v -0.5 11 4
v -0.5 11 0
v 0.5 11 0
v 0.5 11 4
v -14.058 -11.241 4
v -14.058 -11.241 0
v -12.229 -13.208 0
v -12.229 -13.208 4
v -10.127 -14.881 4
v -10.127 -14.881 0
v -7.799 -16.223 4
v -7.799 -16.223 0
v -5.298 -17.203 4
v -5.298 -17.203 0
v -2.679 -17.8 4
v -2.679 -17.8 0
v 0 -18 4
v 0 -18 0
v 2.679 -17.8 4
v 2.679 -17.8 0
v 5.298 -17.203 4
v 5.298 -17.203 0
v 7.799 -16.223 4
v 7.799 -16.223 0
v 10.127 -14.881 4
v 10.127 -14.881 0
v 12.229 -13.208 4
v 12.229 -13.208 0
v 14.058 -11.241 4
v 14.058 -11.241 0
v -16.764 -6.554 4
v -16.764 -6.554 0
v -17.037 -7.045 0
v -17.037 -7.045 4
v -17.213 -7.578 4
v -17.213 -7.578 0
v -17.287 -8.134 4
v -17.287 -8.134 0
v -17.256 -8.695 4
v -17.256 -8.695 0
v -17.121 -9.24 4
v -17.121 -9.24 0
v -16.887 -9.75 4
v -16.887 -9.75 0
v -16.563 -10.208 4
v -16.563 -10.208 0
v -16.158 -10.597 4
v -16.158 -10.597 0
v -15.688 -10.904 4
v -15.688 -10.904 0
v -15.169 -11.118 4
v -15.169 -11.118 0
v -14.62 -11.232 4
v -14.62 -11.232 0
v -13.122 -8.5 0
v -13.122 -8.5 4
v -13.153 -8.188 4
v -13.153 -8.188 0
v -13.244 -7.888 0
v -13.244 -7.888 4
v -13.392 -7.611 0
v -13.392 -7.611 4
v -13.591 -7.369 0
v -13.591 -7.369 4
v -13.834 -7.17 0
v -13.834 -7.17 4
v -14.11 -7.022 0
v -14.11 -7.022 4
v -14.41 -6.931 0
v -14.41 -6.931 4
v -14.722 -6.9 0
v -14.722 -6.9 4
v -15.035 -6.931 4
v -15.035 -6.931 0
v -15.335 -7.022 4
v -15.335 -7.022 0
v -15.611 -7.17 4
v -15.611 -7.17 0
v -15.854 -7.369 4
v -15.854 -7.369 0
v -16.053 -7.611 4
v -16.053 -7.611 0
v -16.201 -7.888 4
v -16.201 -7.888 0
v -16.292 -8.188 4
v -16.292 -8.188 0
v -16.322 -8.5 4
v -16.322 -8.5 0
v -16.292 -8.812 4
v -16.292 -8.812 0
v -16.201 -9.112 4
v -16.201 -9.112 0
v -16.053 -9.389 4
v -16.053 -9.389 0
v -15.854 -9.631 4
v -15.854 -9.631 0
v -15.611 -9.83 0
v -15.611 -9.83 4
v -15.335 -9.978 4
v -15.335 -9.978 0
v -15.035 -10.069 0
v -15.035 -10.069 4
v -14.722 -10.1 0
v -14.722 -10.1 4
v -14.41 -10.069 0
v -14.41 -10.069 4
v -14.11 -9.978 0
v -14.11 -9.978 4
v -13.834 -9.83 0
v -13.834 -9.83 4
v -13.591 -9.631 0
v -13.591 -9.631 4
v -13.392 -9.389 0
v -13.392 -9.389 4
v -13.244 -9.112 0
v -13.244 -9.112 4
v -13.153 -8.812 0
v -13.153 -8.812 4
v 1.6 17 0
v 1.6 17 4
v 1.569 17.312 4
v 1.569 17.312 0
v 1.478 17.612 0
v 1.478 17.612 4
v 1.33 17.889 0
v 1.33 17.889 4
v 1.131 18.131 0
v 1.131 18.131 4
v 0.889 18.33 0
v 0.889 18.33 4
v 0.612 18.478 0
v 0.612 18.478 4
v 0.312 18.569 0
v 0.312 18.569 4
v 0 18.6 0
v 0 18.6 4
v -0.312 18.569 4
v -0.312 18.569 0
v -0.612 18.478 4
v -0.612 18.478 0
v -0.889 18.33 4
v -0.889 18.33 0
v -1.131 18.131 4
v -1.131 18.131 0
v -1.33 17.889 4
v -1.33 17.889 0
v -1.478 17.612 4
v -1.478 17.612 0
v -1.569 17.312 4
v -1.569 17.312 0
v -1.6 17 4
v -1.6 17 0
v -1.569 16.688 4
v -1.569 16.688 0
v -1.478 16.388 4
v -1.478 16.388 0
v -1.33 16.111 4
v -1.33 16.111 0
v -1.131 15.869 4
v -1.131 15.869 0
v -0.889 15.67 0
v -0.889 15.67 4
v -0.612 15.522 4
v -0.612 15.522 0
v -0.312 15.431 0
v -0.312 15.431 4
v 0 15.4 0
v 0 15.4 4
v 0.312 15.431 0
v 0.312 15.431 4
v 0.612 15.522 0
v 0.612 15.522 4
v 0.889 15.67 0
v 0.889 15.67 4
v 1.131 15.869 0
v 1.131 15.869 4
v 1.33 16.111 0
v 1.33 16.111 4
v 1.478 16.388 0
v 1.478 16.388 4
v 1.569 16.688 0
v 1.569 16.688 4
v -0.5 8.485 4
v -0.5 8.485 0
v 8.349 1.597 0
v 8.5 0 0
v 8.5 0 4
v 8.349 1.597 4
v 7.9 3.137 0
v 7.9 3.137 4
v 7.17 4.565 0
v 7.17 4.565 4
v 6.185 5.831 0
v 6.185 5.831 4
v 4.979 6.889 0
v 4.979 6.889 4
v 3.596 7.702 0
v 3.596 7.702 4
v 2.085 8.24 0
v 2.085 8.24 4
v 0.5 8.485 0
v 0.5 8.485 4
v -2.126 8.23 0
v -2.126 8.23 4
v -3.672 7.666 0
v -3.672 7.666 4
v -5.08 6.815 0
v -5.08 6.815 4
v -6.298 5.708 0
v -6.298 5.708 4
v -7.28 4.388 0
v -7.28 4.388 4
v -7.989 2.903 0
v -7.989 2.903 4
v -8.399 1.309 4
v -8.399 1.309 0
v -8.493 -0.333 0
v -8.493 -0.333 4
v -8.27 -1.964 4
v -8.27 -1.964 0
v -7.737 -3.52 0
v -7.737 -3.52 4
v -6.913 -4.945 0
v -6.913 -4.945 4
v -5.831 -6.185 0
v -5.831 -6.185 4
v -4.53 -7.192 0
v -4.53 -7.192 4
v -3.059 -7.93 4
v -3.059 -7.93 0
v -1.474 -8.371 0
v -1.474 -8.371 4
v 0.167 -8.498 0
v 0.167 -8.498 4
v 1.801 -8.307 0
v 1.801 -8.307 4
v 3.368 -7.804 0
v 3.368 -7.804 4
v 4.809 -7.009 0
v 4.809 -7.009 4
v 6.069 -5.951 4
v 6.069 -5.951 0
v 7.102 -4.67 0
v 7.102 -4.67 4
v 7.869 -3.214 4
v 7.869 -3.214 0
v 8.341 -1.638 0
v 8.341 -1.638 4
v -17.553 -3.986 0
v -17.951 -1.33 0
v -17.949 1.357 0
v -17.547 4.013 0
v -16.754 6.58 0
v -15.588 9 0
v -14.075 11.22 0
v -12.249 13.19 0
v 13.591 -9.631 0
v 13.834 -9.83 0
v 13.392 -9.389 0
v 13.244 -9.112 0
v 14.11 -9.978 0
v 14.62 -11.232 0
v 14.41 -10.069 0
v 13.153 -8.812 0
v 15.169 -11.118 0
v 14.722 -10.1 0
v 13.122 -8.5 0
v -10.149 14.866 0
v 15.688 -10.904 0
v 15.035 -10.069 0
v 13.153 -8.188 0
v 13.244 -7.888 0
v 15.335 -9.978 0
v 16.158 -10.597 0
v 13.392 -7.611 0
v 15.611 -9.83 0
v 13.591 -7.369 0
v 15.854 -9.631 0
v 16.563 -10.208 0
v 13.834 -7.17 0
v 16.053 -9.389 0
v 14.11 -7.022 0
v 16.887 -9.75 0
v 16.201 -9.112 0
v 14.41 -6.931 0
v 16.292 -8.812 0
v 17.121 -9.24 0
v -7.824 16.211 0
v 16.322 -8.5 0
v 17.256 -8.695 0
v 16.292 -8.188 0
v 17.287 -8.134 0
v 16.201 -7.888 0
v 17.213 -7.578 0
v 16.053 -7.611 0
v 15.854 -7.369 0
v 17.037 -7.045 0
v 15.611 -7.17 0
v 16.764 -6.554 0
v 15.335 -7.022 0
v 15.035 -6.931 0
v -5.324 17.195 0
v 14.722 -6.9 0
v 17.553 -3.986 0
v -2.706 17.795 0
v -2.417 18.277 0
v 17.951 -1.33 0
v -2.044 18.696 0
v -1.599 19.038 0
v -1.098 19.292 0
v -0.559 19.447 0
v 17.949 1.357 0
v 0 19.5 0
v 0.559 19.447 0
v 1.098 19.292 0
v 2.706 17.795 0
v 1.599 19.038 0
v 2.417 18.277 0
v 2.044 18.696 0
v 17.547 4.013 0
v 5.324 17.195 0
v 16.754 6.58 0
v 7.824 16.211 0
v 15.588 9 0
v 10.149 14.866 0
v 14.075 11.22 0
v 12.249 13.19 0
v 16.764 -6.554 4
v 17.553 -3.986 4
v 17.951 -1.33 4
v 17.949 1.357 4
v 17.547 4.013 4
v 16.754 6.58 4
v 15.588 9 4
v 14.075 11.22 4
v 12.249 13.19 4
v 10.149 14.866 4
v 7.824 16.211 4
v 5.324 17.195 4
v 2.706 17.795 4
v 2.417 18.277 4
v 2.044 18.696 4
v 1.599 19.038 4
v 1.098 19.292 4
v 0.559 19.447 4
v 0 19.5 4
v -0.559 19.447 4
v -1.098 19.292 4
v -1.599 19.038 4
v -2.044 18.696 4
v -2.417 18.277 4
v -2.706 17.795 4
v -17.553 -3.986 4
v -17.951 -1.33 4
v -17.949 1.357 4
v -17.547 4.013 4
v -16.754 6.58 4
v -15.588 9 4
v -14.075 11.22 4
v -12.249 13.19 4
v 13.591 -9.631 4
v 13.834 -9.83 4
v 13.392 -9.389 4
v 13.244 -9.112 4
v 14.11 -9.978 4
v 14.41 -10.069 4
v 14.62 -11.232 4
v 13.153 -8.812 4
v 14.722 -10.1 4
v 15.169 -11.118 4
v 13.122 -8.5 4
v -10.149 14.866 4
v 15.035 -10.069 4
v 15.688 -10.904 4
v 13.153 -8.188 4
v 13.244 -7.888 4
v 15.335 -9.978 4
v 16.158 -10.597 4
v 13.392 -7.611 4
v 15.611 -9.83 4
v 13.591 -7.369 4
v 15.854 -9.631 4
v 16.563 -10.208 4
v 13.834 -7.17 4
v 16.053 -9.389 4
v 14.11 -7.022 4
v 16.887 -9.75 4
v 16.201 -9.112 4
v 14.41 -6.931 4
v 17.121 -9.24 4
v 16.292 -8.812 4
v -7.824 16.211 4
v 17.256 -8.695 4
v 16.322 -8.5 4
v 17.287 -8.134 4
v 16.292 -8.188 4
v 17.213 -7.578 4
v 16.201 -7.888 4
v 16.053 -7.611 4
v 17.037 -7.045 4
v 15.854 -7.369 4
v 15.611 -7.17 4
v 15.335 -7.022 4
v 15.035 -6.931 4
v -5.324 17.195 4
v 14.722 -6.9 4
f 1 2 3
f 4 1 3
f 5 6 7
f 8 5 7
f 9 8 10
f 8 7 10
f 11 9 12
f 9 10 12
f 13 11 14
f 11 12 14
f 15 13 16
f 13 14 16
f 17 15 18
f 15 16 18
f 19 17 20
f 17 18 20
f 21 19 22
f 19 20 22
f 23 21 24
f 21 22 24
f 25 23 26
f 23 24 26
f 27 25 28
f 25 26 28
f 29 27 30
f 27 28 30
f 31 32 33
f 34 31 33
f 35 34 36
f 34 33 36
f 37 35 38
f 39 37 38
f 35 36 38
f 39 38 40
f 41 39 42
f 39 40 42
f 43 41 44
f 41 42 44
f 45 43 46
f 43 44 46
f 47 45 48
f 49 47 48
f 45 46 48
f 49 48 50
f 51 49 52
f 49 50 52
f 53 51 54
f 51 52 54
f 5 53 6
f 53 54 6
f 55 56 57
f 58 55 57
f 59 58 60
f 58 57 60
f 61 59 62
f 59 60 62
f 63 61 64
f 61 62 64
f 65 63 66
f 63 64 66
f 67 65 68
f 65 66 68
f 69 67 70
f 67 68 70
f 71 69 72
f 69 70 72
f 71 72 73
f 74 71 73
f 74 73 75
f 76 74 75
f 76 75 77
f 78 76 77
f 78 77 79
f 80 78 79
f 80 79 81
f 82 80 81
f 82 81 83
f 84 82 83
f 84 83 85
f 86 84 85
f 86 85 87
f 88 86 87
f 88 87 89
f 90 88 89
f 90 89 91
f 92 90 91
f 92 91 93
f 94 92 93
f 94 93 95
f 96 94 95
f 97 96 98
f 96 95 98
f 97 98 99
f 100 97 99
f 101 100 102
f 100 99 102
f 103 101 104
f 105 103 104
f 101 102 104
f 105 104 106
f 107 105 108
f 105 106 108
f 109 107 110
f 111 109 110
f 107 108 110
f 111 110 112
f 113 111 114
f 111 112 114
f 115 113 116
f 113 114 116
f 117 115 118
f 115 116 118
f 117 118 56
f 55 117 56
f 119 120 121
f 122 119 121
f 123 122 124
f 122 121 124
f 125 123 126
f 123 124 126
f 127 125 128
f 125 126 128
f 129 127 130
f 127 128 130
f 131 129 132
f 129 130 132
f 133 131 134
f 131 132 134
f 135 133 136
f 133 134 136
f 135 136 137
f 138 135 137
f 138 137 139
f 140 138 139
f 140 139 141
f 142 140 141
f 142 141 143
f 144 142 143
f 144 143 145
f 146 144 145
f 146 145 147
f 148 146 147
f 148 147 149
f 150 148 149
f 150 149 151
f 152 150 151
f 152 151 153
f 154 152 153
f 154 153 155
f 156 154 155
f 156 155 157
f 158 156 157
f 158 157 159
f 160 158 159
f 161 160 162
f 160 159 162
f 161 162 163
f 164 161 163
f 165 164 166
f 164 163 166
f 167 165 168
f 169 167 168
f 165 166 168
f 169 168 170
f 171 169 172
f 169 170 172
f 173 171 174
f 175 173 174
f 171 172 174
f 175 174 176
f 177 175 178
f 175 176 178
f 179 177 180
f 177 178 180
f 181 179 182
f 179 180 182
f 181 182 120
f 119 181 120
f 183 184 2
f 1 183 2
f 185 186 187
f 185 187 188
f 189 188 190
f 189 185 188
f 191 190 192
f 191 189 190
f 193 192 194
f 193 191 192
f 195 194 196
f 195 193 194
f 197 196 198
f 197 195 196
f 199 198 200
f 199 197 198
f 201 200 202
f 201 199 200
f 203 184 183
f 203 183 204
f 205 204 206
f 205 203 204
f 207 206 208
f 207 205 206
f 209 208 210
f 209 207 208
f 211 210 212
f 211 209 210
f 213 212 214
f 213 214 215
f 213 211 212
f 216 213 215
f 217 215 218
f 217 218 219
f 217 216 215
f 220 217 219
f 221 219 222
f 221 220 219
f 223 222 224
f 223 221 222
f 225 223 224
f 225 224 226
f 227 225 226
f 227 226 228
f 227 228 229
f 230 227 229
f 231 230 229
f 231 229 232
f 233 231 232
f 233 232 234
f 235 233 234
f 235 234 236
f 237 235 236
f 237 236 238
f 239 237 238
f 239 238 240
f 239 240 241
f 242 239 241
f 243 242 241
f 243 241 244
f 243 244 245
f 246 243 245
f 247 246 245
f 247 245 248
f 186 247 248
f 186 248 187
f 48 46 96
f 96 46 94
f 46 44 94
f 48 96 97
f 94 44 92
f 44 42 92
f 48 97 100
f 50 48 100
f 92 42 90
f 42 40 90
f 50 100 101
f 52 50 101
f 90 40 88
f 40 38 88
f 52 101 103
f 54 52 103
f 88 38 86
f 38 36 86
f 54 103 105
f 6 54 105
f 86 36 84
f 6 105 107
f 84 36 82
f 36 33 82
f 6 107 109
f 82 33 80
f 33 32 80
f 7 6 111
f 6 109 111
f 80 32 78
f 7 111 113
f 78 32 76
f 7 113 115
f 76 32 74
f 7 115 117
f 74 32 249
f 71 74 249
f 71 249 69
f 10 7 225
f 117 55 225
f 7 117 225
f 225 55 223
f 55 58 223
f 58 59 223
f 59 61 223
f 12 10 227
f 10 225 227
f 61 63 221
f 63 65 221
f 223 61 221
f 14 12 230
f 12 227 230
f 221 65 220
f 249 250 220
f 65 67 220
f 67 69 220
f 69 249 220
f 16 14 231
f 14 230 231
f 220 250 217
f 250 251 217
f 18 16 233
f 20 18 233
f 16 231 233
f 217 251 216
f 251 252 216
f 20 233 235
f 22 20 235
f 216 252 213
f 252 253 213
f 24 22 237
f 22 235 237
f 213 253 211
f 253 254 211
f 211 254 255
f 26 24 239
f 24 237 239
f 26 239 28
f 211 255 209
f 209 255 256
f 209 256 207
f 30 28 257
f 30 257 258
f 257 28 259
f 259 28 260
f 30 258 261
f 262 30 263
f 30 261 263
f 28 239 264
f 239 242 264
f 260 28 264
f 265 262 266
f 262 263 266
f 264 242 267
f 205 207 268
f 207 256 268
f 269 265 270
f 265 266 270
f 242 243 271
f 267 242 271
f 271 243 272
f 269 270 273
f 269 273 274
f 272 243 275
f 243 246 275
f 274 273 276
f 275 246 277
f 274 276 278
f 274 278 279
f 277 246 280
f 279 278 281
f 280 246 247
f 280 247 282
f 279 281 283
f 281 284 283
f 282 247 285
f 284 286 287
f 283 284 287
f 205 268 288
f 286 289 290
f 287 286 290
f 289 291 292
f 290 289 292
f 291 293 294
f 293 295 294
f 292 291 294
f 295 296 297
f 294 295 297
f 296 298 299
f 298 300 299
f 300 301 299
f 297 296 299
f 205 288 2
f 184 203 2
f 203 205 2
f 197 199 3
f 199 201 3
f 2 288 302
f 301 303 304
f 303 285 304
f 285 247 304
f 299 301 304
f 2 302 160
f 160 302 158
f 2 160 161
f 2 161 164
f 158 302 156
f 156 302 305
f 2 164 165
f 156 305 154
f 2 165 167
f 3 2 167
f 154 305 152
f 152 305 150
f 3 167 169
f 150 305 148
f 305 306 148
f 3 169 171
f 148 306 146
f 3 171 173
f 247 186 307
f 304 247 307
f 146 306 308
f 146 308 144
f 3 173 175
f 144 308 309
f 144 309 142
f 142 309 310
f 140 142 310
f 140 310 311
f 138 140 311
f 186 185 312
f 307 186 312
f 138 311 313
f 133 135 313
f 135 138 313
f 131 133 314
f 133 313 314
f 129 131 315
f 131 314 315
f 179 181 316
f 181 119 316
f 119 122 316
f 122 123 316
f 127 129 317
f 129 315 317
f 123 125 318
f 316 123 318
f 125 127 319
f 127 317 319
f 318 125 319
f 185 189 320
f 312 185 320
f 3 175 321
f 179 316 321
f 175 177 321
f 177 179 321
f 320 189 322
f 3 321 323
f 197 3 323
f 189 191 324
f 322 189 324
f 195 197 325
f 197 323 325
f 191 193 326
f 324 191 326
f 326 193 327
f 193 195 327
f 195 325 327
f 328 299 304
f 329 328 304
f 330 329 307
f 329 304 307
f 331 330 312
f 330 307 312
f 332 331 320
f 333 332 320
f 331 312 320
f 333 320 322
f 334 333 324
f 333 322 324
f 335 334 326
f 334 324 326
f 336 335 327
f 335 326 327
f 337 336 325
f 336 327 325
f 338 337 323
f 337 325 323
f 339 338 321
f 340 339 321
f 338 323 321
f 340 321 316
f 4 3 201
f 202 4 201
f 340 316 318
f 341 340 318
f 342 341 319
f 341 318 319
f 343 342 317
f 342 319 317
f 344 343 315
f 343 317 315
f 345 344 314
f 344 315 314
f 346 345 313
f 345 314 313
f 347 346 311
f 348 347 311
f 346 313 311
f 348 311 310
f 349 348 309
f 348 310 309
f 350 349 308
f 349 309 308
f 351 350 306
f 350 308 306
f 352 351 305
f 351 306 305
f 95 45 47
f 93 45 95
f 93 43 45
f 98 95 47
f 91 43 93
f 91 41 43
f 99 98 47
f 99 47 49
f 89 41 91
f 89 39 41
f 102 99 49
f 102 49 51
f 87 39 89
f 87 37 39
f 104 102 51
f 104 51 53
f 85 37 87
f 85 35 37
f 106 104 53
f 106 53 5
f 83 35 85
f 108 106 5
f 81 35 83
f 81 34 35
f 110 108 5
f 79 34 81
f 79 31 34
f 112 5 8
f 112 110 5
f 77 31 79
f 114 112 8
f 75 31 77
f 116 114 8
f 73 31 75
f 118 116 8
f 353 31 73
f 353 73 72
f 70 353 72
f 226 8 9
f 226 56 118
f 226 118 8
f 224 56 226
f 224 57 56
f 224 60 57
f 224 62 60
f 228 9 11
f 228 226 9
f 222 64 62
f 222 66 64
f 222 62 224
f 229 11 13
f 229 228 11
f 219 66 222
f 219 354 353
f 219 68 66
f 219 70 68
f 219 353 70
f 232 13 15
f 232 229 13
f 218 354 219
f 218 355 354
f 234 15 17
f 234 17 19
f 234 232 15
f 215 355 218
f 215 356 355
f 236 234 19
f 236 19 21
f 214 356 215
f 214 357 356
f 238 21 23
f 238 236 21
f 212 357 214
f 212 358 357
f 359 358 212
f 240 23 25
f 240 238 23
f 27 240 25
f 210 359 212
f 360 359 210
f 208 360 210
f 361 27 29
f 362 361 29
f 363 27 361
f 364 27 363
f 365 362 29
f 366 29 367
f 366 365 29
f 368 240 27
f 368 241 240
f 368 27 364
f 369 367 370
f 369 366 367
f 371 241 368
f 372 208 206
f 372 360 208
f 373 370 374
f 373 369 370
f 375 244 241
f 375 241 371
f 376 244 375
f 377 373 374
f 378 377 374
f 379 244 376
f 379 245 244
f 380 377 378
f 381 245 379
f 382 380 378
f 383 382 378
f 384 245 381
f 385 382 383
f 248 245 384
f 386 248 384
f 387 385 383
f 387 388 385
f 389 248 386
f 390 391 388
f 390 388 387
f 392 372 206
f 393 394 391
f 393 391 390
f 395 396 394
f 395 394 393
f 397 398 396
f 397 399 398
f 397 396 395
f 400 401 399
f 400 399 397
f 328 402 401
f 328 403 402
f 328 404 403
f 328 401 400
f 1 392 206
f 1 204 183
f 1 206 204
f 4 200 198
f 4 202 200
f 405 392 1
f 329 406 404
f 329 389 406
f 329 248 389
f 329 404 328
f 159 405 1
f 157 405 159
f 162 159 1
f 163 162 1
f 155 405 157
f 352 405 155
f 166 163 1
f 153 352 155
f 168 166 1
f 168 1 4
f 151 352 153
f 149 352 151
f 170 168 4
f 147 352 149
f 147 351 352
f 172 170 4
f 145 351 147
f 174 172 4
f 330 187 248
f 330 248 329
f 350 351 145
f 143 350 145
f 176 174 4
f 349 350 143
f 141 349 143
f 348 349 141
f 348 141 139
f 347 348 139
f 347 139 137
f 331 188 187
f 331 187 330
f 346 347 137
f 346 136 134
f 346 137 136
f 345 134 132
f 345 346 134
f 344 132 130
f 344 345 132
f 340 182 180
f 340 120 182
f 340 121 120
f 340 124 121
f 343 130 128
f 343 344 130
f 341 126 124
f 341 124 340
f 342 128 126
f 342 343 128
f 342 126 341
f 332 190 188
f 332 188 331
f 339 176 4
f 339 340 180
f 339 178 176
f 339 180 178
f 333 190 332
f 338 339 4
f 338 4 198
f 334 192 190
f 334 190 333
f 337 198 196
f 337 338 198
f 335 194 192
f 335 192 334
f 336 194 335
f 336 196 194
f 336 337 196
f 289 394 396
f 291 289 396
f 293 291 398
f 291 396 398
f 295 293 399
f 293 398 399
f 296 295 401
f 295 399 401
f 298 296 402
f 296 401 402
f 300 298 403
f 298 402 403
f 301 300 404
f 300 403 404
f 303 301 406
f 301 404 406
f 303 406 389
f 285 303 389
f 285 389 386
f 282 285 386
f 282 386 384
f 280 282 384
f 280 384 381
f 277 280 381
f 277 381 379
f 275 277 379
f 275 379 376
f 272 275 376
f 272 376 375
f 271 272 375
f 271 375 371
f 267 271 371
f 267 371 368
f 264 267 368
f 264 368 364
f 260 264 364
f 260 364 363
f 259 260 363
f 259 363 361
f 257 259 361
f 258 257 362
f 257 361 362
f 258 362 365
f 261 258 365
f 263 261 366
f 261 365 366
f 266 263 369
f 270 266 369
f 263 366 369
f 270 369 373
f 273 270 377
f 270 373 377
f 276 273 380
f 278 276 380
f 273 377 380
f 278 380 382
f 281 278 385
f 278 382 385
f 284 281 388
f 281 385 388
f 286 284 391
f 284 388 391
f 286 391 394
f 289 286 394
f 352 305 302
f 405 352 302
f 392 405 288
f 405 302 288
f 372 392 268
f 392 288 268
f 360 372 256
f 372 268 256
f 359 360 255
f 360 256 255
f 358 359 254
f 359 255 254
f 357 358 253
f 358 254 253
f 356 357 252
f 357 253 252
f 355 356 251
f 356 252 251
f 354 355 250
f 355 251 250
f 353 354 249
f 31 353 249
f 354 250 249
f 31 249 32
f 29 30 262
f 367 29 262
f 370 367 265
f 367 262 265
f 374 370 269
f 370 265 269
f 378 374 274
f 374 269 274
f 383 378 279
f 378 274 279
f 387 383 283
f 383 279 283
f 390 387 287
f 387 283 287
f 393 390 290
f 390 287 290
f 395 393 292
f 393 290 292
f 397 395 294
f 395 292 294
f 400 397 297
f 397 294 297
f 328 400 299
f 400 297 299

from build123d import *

# Parameters (mm, degrees)
SKETCH_1_R               = 8.5
EXTRUDE_1_DEPTH          = 4
SKETCH_2_R               = 1.6
CUT_EXTRUDE_1_DEPTH      = 10
CUT_EXTRUDE_3_DEPTH      = 1
CUT_EXTRUDE_3_DEPTH_BACK = 4


with BuildPart() as part:
    # 草图1 → 凸台-拉伸1 (new body)
    with BuildSketch(Plane.XY):
        with BuildLine():
            ThreePointArc((-14.058374697, -11.241089844), (0, -18), (14.058374697, -11.241089844))
            ThreePointArc((14.058374697, -11.241089844), (16.887495374, -9.75), (16.76425672, -6.554364701))
            ThreePointArc((16.76425672, -6.554364701), (15.588457268, 9), (2.705882023, 17.795454545))
            ThreePointArc((2.705882023, 17.795454545), (0, 19.5), (-2.705882023, 17.795454545))
            ThreePointArc((-2.705882023, 17.795454545), (-15.588457268, 9), (-16.76425672, -6.554364701))
            ThreePointArc((-16.76425672, -6.554364701), (-16.887495374, -9.75), (-14.058374697, -11.241089844))
        make_face()
        Circle(SKETCH_1_R, mode=Mode.SUBTRACT)
    extrude(amount=EXTRUDE_1_DEPTH)

    # 草图2 → 切除-拉伸1 (cut)
    with BuildSketch(Plane.XY.offset(4)):
        with Locations((0, 17)):
            Circle(SKETCH_2_R)
        with Locations((14.722431864, -8.5)):
            Circle(SKETCH_2_R)
        with Locations((-14.722431864, -8.5)):
            Circle(SKETCH_2_R)
    extrude(amount=-CUT_EXTRUDE_1_DEPTH, mode=Mode.SUBTRACT)

    # 草图3 → 切除-拉伸3 (cut, two sides)
    with BuildSketch(Plane(origin=(0, 0, 0), x_dir=(-1, 0, 0), z_dir=(0, 0, -1))) as cut_extrude_3_sk:
        with BuildLine():
            ThreePointArc((-0.5, 8.485281374), (0, 8.5), (0.5, 8.485281374))
            Line((0.5, 8.485281374), (0.5, 11))
            Line((0.5, 11), (-0.5, 11))
            Line((-0.5, 11), (-0.5, 8.485281374))
        make_face()
    extrude(amount=CUT_EXTRUDE_3_DEPTH, mode=Mode.SUBTRACT)
    extrude(cut_extrude_3_sk.sketch, amount=-CUT_EXTRUDE_3_DEPTH_BACK, mode=Mode.SUBTRACT)


solid = part.part
